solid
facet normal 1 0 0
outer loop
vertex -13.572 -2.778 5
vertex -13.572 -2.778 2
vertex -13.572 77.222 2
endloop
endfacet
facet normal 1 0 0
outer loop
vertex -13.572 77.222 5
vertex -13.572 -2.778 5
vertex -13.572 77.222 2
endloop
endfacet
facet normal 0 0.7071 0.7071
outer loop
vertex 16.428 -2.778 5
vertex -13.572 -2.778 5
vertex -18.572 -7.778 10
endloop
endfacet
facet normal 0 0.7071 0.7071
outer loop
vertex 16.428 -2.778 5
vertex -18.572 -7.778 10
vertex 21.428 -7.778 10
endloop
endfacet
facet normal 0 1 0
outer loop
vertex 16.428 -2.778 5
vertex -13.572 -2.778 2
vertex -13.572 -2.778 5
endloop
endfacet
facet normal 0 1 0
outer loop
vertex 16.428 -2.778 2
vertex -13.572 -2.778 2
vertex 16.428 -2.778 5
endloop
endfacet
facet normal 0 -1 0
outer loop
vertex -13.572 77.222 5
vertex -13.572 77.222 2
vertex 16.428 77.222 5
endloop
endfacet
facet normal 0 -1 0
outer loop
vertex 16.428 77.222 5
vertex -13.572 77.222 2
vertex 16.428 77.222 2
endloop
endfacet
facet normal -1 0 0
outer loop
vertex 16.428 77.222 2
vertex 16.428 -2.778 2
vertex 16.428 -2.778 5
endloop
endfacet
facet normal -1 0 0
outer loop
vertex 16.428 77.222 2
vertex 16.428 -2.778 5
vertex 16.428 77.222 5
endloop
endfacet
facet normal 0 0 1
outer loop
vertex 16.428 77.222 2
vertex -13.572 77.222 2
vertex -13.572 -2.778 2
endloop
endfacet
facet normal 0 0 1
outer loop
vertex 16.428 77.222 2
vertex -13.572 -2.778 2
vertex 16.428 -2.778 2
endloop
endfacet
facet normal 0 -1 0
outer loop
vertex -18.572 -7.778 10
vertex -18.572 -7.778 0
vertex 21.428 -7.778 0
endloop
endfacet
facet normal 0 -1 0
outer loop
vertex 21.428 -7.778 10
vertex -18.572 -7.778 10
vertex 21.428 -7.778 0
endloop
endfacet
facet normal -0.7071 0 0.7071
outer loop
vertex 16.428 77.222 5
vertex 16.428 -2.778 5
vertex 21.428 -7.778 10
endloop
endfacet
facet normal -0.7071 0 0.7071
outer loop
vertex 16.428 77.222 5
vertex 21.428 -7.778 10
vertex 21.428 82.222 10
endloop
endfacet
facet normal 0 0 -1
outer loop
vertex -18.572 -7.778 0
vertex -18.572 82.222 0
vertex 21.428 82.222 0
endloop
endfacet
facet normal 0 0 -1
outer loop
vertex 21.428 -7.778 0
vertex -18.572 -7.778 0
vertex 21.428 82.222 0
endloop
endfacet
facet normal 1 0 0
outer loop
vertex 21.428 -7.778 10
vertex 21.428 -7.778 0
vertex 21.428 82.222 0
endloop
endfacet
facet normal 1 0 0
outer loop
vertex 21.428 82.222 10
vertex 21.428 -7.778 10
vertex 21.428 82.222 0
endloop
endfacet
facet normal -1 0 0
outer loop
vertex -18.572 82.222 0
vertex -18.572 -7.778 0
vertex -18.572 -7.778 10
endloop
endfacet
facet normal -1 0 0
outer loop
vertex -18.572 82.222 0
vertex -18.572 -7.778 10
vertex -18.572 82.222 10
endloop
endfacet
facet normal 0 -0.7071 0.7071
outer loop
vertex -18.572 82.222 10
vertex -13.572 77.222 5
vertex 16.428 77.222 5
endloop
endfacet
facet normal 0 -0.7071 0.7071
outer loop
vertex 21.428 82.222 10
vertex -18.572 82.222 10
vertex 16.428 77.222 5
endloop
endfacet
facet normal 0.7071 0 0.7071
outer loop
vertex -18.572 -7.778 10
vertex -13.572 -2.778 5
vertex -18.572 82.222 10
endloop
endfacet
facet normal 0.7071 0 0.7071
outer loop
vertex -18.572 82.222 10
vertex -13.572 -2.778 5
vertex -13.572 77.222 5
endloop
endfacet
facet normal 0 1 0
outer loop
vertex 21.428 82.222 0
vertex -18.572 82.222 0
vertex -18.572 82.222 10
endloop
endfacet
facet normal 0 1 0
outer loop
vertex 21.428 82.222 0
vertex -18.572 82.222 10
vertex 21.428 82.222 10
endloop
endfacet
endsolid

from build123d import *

# Parameters (mm, degrees)
F0_W     = 40
F0_H     = 90
F0_W_2   = 30
F0_H_2   = 80
F1_DEPTH = 10
F2_DEPTH = 2
F3_SIZE  = 4.99999


# Not quite as in the source:
# - a fillet or chamfer is up to 0.001 mm smaller than in the source, because OpenCascade refuses the exact size


with BuildPart() as f1:
    # F0 (on Top) → F1 (new body)
    with BuildSketch(Plane.XY):
        with Locations((1.4284082502, 37.2216339977)):
            Rectangle(F0_W, F0_H)
        with Locations((1.4284082502, 37.2216339977)):
            Rectangle(F0_W_2, F0_H_2, mode=Mode.SUBTRACT)
    extrude(amount=F1_DEPTH)

    # F0 (on Top) → F2 (join)
    with BuildSketch(Plane.XY):
        with Locations((1.4284082502, 37.2216339977)):
            Rectangle(F0_W_2, F0_H_2)
    extrude(amount=F2_DEPTH)

    # F3 (size 5 in the source; OpenCascade refuses exactly that, so slightly less here)
    f3_edges = [f1.edges().sort_by_distance(p)[0] for p in [
        (16.428408, 37.221634, 10),
        (1.428408, 77.221634, 10),
        (-13.571592, 37.221634, 10),
        (1.428408, -2.778366, 10),
    ]]
    chamfer(f3_edges, length=F3_SIZE)


solid = f1.part
